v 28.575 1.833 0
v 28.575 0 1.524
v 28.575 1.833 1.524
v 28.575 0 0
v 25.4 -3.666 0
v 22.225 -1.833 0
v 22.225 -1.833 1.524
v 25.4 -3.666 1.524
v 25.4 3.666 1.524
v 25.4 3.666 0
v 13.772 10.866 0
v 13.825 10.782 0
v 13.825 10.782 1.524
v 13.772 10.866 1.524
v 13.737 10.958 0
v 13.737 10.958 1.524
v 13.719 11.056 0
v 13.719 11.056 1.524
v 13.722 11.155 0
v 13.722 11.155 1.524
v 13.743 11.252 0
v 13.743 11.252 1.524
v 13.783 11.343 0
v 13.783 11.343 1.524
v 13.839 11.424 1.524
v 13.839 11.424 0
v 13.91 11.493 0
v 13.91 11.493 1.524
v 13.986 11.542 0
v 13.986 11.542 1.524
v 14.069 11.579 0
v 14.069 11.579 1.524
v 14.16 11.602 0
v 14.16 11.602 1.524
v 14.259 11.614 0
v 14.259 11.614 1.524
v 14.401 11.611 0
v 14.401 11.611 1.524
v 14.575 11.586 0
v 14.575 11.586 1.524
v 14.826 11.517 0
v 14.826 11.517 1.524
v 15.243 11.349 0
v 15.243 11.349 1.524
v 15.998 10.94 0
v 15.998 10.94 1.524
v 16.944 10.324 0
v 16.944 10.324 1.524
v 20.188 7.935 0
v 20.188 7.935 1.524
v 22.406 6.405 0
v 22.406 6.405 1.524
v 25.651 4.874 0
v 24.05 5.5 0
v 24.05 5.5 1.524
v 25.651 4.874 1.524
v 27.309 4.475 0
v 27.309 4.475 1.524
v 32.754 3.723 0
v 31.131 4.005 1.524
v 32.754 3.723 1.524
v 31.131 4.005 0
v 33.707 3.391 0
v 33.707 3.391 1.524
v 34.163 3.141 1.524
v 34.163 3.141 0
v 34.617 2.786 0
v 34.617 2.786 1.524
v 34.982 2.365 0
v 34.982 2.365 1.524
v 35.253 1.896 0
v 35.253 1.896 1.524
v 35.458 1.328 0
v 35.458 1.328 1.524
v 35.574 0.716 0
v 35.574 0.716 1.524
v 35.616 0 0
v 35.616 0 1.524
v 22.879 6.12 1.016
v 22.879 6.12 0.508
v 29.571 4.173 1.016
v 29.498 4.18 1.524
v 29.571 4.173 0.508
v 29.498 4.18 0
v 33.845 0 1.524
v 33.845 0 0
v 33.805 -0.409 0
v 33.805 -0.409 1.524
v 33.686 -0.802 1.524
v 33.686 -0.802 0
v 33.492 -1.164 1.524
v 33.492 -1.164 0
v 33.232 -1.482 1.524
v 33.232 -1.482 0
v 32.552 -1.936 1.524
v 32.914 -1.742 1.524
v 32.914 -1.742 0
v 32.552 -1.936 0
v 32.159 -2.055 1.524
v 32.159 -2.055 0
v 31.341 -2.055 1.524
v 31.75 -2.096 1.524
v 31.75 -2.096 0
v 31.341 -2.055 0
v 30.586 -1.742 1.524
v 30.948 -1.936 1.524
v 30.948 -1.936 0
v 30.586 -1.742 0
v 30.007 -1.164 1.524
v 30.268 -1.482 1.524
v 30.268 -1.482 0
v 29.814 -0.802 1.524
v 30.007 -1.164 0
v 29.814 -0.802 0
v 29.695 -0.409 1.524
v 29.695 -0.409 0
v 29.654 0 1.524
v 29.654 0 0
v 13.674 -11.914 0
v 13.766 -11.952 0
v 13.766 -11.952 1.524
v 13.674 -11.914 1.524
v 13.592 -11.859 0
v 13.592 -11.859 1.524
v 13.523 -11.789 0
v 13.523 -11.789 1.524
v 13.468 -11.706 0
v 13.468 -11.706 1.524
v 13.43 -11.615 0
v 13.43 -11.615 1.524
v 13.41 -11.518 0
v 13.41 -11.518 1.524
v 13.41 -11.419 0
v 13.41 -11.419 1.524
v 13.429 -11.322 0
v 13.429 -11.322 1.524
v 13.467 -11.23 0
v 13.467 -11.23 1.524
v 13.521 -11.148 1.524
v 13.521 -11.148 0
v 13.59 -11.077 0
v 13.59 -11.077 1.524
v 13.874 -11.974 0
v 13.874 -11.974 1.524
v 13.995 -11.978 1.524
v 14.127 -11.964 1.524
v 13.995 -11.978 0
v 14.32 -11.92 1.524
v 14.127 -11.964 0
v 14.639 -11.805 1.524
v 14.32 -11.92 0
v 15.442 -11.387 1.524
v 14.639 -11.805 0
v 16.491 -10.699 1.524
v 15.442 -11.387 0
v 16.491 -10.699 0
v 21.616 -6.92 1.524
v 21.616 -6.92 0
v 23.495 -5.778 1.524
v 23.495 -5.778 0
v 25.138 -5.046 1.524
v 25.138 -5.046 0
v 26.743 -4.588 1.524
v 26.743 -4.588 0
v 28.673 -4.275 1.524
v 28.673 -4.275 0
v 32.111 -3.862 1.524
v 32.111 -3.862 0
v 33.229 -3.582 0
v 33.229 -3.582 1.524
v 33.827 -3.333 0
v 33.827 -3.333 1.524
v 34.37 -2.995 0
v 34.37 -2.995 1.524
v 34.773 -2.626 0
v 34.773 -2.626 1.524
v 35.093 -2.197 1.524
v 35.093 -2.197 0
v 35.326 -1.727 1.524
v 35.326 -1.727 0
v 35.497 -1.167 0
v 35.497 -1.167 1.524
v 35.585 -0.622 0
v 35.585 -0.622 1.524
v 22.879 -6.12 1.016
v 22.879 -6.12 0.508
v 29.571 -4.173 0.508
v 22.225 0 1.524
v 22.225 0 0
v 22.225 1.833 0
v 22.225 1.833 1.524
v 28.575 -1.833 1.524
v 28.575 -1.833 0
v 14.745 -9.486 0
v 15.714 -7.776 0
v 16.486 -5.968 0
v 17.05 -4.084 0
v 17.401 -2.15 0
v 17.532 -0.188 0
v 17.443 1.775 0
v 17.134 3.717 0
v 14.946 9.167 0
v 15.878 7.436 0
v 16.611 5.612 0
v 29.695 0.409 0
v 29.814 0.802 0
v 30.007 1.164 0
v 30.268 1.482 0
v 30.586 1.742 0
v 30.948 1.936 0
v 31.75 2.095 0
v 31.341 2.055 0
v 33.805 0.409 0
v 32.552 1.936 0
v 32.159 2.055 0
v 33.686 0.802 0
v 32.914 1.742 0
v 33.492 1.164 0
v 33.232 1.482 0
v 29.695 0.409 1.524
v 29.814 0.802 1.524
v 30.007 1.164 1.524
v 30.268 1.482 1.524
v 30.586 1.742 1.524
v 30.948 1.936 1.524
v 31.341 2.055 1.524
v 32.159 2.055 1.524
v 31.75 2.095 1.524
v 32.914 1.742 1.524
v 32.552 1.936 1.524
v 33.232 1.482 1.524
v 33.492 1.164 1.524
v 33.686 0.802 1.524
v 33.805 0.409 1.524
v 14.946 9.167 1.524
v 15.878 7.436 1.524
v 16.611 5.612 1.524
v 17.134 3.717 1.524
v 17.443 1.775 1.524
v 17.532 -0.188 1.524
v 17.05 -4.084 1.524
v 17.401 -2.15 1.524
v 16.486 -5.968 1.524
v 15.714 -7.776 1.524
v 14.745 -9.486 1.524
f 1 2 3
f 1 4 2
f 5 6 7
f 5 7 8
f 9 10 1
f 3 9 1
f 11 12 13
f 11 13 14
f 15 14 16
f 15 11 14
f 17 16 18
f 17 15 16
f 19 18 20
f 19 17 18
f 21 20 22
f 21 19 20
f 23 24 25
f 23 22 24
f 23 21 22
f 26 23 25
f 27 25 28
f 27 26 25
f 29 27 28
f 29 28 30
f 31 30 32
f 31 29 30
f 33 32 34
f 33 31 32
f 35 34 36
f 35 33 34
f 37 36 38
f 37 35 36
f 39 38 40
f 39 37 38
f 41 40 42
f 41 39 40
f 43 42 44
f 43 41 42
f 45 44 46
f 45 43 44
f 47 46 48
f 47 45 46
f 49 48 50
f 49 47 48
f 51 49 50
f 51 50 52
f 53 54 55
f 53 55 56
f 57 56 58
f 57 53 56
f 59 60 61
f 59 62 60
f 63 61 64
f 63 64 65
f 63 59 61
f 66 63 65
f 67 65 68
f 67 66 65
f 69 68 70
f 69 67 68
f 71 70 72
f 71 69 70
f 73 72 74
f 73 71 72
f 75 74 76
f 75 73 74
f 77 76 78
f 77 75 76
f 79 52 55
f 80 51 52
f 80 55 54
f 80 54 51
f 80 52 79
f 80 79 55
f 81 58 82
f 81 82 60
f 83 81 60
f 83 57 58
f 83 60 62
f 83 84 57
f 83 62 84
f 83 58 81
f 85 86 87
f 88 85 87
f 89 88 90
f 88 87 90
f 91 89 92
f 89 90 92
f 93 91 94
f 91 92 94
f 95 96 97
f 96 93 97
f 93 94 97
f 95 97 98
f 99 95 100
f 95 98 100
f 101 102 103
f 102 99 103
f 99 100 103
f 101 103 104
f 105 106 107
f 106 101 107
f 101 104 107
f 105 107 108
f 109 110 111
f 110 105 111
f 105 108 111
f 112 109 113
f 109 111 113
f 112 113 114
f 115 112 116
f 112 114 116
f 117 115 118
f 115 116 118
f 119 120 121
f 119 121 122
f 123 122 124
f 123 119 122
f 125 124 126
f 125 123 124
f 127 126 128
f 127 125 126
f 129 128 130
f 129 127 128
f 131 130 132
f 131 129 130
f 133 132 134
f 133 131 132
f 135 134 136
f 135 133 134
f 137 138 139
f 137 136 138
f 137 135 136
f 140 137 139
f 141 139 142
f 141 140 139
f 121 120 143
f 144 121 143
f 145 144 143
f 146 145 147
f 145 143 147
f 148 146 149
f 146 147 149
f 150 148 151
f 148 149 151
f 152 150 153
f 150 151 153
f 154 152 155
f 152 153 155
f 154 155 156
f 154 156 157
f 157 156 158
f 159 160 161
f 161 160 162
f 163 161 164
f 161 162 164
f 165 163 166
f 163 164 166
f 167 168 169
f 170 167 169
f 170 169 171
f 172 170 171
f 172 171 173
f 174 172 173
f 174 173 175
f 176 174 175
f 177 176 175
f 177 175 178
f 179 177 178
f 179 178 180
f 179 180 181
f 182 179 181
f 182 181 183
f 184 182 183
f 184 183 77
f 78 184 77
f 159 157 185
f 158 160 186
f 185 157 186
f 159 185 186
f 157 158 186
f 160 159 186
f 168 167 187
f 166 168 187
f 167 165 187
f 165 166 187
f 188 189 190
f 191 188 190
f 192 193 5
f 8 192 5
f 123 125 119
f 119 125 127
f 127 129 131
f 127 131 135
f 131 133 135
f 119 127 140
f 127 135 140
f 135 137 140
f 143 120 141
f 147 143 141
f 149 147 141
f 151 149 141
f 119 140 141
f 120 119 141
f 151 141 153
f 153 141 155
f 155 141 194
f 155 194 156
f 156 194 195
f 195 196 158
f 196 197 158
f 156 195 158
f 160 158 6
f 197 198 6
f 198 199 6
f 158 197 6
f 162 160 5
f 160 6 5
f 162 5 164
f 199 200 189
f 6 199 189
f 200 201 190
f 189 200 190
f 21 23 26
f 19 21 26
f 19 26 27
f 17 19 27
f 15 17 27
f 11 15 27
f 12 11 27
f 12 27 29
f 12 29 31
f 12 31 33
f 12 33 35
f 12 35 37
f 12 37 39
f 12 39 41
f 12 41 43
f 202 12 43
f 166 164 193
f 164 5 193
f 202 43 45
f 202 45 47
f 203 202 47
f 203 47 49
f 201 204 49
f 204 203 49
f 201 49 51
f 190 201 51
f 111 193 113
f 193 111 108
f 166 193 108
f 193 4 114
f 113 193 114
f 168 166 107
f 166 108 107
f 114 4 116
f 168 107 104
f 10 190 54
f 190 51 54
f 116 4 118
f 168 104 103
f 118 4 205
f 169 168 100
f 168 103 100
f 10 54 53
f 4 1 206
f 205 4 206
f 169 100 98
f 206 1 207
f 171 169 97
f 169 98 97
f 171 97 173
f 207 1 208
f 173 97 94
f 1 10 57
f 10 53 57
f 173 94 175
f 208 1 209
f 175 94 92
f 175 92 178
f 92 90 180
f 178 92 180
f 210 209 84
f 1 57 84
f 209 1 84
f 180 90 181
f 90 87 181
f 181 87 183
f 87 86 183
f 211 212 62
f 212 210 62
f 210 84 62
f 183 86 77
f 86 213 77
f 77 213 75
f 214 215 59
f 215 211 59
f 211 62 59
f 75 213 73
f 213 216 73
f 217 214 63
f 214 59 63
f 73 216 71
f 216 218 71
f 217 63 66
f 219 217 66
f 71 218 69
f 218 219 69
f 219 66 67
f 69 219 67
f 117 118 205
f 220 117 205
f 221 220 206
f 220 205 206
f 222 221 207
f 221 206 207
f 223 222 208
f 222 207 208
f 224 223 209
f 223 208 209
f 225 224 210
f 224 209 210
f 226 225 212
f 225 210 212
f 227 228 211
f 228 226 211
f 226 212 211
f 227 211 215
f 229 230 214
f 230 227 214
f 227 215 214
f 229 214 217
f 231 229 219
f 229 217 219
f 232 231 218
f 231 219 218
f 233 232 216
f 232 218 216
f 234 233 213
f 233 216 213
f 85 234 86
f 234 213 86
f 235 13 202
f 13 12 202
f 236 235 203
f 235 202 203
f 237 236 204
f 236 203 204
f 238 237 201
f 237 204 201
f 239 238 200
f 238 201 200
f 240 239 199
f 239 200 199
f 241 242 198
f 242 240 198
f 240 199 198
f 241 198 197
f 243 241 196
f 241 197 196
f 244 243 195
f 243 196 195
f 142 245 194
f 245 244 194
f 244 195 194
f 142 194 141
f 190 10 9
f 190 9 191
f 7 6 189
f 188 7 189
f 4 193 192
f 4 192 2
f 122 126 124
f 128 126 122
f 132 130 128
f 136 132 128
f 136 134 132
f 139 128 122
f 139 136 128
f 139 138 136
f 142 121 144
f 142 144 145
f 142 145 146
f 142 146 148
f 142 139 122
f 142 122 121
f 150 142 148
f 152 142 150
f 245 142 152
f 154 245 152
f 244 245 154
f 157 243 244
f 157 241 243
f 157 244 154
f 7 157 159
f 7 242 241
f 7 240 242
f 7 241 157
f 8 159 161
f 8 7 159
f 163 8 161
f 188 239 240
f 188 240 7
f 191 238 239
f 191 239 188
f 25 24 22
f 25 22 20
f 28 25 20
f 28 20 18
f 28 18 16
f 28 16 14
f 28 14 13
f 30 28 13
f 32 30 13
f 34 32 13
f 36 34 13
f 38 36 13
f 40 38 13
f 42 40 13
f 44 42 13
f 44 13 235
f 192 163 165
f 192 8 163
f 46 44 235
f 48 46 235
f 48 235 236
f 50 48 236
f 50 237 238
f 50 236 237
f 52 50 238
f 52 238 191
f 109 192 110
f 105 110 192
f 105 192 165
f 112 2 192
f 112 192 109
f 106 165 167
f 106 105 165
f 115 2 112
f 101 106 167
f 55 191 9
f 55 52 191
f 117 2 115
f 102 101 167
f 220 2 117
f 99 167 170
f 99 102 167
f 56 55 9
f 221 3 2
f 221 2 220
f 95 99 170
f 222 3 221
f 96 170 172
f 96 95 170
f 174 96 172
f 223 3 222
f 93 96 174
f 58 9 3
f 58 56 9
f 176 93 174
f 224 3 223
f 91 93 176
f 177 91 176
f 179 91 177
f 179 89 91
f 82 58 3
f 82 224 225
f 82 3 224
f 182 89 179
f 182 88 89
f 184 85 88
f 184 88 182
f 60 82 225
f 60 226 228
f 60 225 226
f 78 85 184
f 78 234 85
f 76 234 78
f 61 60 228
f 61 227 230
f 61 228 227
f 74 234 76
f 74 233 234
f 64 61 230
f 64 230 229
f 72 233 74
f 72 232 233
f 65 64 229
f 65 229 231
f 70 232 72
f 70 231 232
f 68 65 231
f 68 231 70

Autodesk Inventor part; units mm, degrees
ref_plane "YZ Plane" through (0, 0, 0) normal (1, 0, 0) x (0, 1, 0)
ref_plane "XZ Plane" through (0, 0, 0) normal (0, 1, 0) x (-1, 0, 0)
ref_plane "XY Plane" through (0, 0, 0) normal (0, 0, 1) x (1, 0, 0)
sketch "Sketch1" plane through (0, 0, 0) normal (0, 0, 1) x (1, 0, 0)
  line L0 (25.3998, 3.6661) -> (28.5748, 1.833)
  line L1 (28.5748, -1.8332) -> (28.5748, 1.833)
  line L2 (28.5748, -1.8332) -> (25.3998, -3.6663)
  line L3 (22.2248, -1.8332) -> (25.3998, -3.6663)
  line L4 (22.2248, -1.8332) -> (22.2248, 1.833)
  line L5 (25.3998, 3.6661) -> (22.2248, 1.833)
  arc A0 (13.9103, 11.4928) -> (13.8254, 10.7824) centre (14.226, 11.0948) ccw
  arc A1 (13.5904, -11.0771) -> (13.7656, -11.9524) centre (13.9159, -11.4671) ccw
  arc A2 (13.5904, -11.0771) -> (13.8254, 10.7824) centre (0, 0) ccw
  circle A3 centre (31.7498, -0.0001) radius 2.0955
  line L6 (31.7498, -0.0001) -> (19.0498, -0.0001)
  line L7 (13.9103, 11.4928) -> (14.9529, 12.3199) construction
  line L8 (14.9529, 12.3199) -> (21.939, 5.9941) construction
  line L9 (21.939, 5.9941) -> (26.2427, 4.1527) construction
  line L10 (26.2427, 4.1527) -> (30.9051, 4.1527) construction
  line L11 (30.9051, 4.1527) -> (35.6157, 3.494) construction
  line L12 (35.6157, 3.494) -> (35.6157, -0.0001) construction
  spline S0 degree 4 poles (13.9103, 11.4928) (14.9529, 12.3199) (21.939, 5.9941) (26.2427, 4.1527) (30.9051, 4.1527) (35.6157, 3.494) (35.6157, -0.0001) knots 1 1 1 1 1 2 3 4 4 4 4 4
  line L13 (13.7656, -11.9524) -> (14.9529, -12.3201) construction
  line L14 (14.9529, -12.3201) -> (21.939, -5.9943) construction
  line L15 (21.939, -5.9943) -> (26.2427, -4.1529) construction
  line L16 (26.2427, -4.1529) -> (30.9051, -4.1529) construction
  line L17 (30.9051, -4.1529) -> (35.6157, -3.4942) construction
  line L18 (35.6157, -3.4942) -> (35.6157, -0.0001) construction
  spline S1 degree 4 poles (13.7656, -11.9524) (14.9529, -12.3201) (21.939, -5.9943) (26.2427, -4.1529) (30.9051, -4.1529) (35.6157, -3.4942) (35.6157, -0.0001) knots 1 1 1 1 1 2 3 4 4 4 4 4
  point P0 (0, 0)
  point P1 (16.4691, 5.9941)
  point P2 (16.469, -5.9943)
  point P3 (25.3998, -0.0001)
  dimension "d31" = 3.6662
  dimension "d32" = 3.6662
  dimension "d34" = 3.6662
  dimension "d35" = 3.6662
  dimension "d36" = 3.6662
  dimension "d37" = 3.6662
  dimension "d44" = 4.191
extrude "Extrusion6" add sketch "Sketch1" along normal blind 1.524
equation "\"d32\" = d31"
equation "\"d34\" = d31"
equation "\"d35\" = d31"
equation "\"d36\" = d31"
equation "\"d37\" = d31"
properties part number "gear-interface"
